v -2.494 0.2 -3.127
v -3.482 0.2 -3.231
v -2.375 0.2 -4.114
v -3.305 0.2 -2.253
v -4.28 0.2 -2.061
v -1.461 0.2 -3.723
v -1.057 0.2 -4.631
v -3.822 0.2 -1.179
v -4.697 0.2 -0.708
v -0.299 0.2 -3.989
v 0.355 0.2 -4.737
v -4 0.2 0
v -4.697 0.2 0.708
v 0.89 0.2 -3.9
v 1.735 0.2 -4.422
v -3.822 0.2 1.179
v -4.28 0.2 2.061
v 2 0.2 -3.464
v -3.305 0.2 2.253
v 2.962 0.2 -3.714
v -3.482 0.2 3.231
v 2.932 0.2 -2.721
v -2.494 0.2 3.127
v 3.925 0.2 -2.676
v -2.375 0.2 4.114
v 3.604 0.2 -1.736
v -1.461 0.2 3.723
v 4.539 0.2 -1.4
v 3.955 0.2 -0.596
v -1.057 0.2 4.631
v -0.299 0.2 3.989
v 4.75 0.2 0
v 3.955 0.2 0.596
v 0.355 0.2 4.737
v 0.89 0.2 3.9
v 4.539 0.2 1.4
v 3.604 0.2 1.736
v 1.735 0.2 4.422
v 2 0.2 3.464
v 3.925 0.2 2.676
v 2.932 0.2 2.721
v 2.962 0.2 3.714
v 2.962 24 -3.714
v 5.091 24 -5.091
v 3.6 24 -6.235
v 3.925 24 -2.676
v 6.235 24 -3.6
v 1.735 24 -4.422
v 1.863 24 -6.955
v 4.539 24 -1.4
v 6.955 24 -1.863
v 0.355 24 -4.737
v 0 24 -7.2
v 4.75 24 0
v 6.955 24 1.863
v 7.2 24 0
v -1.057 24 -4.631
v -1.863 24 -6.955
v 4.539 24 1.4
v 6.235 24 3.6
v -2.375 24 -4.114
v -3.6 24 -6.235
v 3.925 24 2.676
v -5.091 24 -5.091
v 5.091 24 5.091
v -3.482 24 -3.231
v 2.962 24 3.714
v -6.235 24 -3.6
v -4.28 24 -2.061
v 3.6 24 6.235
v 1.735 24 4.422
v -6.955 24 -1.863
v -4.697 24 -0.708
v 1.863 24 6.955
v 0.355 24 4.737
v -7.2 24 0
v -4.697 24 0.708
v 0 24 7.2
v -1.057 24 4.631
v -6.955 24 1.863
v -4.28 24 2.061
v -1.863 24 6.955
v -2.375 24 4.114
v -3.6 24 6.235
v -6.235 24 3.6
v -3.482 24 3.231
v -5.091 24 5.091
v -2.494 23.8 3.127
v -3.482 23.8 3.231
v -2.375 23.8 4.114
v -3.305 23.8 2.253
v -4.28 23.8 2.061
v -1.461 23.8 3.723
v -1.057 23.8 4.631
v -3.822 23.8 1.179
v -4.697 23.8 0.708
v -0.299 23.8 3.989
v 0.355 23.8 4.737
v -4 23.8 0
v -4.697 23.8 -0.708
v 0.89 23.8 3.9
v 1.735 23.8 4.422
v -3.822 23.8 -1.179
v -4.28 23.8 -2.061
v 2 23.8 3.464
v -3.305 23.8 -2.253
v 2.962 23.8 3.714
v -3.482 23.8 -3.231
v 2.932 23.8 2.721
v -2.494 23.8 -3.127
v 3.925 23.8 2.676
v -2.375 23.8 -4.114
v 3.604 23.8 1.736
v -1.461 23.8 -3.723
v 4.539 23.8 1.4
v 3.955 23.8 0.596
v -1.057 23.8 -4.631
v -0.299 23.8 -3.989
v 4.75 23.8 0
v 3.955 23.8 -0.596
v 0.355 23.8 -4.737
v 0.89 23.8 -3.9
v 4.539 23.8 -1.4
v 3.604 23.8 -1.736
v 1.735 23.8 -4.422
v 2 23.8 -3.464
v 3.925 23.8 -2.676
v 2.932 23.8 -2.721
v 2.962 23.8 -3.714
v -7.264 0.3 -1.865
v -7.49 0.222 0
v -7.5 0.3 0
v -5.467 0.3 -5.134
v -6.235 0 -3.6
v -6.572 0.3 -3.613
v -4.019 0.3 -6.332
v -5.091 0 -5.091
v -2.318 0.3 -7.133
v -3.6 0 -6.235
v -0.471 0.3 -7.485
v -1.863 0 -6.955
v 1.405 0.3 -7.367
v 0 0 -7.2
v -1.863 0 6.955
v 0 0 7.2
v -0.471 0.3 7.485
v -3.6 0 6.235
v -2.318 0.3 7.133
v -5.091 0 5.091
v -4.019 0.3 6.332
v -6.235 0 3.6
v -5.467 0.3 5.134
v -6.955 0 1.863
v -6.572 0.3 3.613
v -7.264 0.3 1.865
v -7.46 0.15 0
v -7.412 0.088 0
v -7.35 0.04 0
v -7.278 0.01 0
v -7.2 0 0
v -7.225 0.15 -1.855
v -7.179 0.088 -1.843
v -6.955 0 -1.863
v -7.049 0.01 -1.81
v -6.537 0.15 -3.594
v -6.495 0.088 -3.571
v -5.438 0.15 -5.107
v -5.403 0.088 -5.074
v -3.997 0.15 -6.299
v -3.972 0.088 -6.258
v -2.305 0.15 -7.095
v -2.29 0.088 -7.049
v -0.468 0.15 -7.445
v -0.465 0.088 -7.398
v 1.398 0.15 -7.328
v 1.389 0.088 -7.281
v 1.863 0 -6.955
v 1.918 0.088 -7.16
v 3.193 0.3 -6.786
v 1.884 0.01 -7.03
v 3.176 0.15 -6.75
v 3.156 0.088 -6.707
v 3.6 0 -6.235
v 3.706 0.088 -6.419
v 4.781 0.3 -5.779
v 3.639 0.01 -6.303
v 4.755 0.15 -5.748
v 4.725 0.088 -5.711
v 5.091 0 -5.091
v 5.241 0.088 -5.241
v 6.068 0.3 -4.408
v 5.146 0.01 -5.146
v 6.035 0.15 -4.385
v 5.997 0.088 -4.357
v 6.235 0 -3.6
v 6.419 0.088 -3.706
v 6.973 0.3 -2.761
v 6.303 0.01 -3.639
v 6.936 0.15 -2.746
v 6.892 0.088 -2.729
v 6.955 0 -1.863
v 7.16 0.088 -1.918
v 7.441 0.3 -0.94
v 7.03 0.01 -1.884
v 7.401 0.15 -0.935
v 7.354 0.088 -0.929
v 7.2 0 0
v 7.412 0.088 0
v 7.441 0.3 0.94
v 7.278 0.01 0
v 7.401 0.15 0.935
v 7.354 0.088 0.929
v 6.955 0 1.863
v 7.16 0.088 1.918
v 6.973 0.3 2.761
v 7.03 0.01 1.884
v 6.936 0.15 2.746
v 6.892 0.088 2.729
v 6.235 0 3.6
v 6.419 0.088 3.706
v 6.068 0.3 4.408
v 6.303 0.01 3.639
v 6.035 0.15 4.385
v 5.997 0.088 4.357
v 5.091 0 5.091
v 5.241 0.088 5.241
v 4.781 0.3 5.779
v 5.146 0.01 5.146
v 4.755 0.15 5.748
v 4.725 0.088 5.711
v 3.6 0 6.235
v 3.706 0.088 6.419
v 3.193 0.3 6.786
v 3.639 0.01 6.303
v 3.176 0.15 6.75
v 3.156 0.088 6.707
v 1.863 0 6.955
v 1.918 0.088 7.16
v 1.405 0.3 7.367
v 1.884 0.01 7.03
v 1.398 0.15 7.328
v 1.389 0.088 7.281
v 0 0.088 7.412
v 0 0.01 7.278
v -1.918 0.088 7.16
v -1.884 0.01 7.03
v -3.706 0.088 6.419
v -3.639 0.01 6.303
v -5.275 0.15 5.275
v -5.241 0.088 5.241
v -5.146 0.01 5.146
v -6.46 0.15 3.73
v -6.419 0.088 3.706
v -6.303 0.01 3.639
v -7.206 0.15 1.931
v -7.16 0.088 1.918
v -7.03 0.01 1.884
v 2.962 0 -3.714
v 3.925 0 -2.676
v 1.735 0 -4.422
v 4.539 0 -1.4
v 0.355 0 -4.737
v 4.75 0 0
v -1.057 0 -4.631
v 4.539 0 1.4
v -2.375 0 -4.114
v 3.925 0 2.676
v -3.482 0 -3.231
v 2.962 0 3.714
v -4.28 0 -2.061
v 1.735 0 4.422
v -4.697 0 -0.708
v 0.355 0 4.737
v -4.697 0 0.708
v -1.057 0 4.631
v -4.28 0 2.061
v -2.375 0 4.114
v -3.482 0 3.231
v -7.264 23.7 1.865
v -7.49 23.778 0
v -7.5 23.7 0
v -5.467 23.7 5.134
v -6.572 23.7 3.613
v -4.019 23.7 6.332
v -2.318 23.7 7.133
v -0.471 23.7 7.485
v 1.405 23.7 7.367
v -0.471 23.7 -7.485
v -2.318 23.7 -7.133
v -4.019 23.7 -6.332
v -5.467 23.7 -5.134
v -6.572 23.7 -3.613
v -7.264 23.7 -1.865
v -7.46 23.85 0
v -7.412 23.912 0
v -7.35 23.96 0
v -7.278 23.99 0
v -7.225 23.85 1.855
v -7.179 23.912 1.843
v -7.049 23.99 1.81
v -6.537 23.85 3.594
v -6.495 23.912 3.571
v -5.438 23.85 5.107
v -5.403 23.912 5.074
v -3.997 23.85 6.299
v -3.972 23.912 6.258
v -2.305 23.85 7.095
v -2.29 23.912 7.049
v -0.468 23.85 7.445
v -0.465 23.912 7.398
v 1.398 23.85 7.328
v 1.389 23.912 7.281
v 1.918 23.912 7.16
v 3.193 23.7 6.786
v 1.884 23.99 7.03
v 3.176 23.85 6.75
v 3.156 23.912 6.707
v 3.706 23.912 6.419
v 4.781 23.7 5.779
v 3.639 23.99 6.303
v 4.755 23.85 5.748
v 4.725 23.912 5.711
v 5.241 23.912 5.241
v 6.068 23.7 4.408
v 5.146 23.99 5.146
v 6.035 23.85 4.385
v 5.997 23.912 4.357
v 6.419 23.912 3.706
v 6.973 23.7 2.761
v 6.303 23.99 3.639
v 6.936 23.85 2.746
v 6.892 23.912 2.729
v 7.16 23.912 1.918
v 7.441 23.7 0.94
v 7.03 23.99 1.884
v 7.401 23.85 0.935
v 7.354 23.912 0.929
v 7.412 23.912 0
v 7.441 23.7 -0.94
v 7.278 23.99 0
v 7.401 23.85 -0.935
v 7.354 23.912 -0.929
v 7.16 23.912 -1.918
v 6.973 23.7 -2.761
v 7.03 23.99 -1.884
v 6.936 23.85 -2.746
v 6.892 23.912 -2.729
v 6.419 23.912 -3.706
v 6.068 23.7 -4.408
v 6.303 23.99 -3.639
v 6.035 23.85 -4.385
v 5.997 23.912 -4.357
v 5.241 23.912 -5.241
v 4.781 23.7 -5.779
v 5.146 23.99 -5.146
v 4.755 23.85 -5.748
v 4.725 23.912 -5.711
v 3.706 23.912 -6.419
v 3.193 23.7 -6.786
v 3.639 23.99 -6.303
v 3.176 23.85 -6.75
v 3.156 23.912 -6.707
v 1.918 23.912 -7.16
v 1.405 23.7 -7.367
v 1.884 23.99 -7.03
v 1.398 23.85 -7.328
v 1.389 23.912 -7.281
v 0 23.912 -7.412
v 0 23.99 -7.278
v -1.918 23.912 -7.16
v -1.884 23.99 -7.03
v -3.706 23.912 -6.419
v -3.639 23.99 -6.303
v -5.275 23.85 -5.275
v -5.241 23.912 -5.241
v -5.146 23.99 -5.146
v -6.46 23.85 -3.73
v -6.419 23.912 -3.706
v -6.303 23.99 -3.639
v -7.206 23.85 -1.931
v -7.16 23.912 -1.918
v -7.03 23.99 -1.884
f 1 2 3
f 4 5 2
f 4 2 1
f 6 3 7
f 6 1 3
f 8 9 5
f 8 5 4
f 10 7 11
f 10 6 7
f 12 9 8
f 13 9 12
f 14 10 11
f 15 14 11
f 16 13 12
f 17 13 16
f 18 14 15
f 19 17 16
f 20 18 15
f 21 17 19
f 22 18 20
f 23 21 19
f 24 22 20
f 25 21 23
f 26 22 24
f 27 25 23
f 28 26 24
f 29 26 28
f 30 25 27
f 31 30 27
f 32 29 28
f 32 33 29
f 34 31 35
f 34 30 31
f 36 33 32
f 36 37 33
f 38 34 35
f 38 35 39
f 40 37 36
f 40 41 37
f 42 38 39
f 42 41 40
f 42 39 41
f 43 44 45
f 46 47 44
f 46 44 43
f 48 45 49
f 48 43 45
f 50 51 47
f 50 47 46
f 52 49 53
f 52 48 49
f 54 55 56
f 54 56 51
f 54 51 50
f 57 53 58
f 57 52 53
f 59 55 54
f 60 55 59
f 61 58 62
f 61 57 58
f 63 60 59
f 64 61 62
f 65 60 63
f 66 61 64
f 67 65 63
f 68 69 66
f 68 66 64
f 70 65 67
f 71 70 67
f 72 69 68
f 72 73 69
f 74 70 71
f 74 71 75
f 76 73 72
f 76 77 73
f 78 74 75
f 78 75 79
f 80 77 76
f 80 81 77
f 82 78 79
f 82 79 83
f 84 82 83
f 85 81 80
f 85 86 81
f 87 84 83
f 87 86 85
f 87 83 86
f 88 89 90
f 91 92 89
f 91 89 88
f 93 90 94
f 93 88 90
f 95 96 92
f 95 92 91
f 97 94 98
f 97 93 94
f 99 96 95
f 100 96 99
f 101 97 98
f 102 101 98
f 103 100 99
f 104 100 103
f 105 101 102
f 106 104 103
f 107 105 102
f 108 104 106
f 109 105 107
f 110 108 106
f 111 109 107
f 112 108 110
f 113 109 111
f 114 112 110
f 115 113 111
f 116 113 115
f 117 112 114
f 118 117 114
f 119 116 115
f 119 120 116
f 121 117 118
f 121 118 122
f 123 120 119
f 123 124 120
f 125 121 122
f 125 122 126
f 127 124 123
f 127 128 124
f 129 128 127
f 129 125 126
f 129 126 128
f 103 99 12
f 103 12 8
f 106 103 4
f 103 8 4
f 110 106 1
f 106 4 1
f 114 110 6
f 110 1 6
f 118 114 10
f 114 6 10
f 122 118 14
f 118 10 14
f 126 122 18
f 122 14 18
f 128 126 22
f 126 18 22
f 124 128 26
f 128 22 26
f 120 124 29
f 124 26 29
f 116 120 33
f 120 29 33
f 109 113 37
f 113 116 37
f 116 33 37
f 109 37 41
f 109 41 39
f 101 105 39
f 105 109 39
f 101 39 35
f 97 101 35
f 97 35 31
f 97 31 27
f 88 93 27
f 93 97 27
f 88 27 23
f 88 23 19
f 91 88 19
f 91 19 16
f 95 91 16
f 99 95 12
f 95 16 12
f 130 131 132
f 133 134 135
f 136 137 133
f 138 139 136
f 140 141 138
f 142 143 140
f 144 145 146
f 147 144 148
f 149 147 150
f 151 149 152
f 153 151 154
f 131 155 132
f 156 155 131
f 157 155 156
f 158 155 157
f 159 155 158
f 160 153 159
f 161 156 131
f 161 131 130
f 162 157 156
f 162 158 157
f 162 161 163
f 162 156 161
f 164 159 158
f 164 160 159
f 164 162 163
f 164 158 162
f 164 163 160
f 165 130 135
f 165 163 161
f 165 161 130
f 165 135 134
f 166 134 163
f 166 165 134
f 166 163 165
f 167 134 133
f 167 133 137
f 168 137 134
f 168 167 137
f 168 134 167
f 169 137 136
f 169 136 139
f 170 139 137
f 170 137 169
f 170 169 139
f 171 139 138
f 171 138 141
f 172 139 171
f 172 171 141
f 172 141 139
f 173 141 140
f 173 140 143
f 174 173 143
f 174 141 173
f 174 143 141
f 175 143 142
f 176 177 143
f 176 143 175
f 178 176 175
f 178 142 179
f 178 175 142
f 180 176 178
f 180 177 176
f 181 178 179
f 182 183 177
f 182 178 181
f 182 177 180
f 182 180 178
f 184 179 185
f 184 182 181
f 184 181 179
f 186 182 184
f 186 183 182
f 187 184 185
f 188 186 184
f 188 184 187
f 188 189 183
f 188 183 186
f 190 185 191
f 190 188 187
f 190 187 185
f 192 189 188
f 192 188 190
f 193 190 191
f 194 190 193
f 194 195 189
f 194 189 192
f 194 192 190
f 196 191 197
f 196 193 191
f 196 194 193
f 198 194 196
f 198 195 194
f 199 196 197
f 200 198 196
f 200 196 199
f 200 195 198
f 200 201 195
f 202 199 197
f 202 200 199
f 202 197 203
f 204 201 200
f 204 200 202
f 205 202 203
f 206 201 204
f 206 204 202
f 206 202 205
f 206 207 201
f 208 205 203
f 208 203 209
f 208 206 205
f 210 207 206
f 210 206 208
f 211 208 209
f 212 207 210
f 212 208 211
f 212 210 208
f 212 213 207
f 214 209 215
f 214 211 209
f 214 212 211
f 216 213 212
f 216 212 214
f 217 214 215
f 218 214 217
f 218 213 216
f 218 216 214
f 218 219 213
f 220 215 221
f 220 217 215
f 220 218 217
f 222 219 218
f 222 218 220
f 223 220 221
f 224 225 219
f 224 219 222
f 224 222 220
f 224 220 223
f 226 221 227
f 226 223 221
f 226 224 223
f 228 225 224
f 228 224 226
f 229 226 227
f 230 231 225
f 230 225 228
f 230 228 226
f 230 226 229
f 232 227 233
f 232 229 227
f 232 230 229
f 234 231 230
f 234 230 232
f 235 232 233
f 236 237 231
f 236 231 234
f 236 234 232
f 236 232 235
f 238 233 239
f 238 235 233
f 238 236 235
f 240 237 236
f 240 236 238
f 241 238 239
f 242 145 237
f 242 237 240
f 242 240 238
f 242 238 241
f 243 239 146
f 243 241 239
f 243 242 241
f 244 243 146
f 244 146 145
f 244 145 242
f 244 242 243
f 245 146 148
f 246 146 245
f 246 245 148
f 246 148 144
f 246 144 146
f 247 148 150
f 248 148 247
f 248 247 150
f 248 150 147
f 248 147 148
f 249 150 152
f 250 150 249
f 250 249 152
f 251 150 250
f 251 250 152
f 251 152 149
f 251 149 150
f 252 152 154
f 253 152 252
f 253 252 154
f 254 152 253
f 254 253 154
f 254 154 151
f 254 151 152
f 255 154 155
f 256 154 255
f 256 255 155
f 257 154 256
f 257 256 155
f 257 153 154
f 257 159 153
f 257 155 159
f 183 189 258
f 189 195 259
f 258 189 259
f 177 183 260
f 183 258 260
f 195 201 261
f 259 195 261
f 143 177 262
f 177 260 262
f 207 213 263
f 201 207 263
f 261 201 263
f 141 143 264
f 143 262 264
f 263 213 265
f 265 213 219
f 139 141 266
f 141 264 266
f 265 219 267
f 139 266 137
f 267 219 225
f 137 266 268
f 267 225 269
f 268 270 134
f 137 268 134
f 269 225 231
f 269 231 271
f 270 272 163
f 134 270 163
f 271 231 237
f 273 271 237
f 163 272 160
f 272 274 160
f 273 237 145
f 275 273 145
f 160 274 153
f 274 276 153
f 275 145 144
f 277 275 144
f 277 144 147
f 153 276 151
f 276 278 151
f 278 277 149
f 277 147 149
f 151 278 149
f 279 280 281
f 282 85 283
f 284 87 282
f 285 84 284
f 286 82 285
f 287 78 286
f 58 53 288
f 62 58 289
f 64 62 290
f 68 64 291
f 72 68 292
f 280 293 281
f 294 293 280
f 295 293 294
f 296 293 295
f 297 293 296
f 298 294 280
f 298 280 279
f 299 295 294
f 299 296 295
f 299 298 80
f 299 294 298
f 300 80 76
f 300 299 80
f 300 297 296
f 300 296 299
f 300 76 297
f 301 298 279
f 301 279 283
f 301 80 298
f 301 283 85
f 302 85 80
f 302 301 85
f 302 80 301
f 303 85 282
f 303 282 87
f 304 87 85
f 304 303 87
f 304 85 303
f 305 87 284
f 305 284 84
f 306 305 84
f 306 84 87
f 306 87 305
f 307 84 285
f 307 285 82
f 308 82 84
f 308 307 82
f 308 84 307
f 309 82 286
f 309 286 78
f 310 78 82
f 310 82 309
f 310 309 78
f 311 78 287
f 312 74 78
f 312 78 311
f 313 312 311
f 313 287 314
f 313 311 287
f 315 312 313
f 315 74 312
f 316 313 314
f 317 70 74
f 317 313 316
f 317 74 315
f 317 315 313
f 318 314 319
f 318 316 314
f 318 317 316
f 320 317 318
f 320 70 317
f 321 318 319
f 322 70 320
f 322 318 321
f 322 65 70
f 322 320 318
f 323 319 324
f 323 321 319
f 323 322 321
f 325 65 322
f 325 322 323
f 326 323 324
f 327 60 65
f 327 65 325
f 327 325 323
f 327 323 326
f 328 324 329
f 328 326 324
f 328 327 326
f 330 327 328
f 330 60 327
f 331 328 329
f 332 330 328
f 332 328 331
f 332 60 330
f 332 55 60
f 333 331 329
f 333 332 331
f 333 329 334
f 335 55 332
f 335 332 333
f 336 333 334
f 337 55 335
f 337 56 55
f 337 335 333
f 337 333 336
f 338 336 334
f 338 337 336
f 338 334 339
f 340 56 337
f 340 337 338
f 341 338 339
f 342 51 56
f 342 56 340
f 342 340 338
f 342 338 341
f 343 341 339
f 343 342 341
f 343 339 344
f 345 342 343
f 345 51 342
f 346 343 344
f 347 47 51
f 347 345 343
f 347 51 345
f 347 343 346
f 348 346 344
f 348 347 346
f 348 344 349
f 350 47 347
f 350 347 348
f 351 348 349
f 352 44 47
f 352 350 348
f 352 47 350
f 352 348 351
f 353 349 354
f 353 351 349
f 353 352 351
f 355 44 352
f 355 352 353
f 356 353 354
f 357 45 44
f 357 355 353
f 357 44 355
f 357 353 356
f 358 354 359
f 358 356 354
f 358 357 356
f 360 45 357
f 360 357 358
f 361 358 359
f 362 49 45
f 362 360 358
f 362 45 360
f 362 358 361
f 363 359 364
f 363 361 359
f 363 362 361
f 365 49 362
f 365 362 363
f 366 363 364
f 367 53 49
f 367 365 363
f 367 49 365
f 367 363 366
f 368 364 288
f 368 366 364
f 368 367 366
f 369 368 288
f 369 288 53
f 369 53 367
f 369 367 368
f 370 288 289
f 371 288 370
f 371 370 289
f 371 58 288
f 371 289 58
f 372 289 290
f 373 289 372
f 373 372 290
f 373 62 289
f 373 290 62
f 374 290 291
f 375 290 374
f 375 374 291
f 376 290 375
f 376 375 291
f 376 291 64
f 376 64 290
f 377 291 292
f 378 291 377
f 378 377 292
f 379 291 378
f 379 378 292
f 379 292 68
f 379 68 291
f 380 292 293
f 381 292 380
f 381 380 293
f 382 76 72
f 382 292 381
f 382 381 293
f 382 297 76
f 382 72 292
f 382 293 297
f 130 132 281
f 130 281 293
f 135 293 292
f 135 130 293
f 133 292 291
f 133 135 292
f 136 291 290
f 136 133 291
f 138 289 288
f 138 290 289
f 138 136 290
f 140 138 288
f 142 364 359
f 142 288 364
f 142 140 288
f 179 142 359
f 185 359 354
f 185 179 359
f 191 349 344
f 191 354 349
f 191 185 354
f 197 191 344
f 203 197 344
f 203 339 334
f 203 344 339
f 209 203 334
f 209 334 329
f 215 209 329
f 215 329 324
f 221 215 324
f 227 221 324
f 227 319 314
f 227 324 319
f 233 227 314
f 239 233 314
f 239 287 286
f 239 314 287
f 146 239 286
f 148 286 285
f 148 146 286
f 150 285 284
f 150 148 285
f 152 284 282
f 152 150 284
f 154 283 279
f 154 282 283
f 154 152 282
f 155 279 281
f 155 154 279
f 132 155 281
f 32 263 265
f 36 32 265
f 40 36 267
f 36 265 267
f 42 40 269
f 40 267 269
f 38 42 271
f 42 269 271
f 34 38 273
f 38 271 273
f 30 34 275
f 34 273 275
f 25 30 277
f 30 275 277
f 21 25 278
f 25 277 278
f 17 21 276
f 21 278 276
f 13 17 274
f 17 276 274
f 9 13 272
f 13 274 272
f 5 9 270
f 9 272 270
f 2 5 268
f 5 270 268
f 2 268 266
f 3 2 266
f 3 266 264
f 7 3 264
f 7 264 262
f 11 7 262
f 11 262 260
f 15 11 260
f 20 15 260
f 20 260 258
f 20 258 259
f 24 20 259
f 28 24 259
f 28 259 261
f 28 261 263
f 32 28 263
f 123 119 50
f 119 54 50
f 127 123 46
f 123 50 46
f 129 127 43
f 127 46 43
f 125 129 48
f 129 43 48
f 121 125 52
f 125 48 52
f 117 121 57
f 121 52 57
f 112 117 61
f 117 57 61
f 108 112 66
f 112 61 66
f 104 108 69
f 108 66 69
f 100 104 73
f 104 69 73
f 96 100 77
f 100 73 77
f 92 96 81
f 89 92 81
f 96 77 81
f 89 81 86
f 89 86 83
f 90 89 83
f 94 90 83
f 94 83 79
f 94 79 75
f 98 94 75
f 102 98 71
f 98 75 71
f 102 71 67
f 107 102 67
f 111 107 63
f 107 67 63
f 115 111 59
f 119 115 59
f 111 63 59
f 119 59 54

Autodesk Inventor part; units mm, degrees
ref_plane "YZ Plane" through (0, 0, 0) normal (1, 0, 0) x (0, 1, 0)
ref_plane "XZ Plane" through (0, 0, 0) normal (0, 1, 0) x (-1, 0, 0)
ref_plane "XY Plane" through (0, 0, 0) normal (0, 0, 1) x (1, 0, 0)
sketch "Sketch1" plane through (0, 0, 0) normal (0, 1, 0) x (-1, 0, 0)
  circle A0 centre (0, 0) radius 7.5
  circle A1 centre (0, 0) radius 4
  dimension "d0" = 15
  dimension "d1" = 8
extrude "Extrusion1" add sketch "Sketch1" along normal blind 24
sketch "Sketch2" plane through (0, 24, 0) normal (0, 1, 0) x (1, 0, 0)
  circle A0 centre (0, 0) radius 4 projected
  circle A1 centre (0, 0) radius 7.5 projected
  circle A2 centre (0, 0) radius 4.75
  dimension "d4" = 9.5
extrude "Extrusion2" cut sketch "Sketch2" against normal blind 0.2 contours A2
sketch "Sketch3" plane through (0, 0, 0) normal (0, -1, 0) x (1, 0, 0)
  circle A0 centre (0, 0) radius 4 projected
  circle A1 centre (0, 0) radius 7.5 projected
  circle A2 centre (0, 0) radius 4.75
  dimension "d7" = 9.5
extrude "Extrusion3" cut sketch "Sketch3" against normal blind 0.2 contours A2
fillet "Fillet1" radius 0.3 2 edges at (7.5, 0, 0) (7.5, 24, 0)
thread "Thread1" size "M8x1.25" class "6H" standard "ANSI Metric M Profile" full length
properties part number "LM8UU" material "Stainless Steel AISI 202"
